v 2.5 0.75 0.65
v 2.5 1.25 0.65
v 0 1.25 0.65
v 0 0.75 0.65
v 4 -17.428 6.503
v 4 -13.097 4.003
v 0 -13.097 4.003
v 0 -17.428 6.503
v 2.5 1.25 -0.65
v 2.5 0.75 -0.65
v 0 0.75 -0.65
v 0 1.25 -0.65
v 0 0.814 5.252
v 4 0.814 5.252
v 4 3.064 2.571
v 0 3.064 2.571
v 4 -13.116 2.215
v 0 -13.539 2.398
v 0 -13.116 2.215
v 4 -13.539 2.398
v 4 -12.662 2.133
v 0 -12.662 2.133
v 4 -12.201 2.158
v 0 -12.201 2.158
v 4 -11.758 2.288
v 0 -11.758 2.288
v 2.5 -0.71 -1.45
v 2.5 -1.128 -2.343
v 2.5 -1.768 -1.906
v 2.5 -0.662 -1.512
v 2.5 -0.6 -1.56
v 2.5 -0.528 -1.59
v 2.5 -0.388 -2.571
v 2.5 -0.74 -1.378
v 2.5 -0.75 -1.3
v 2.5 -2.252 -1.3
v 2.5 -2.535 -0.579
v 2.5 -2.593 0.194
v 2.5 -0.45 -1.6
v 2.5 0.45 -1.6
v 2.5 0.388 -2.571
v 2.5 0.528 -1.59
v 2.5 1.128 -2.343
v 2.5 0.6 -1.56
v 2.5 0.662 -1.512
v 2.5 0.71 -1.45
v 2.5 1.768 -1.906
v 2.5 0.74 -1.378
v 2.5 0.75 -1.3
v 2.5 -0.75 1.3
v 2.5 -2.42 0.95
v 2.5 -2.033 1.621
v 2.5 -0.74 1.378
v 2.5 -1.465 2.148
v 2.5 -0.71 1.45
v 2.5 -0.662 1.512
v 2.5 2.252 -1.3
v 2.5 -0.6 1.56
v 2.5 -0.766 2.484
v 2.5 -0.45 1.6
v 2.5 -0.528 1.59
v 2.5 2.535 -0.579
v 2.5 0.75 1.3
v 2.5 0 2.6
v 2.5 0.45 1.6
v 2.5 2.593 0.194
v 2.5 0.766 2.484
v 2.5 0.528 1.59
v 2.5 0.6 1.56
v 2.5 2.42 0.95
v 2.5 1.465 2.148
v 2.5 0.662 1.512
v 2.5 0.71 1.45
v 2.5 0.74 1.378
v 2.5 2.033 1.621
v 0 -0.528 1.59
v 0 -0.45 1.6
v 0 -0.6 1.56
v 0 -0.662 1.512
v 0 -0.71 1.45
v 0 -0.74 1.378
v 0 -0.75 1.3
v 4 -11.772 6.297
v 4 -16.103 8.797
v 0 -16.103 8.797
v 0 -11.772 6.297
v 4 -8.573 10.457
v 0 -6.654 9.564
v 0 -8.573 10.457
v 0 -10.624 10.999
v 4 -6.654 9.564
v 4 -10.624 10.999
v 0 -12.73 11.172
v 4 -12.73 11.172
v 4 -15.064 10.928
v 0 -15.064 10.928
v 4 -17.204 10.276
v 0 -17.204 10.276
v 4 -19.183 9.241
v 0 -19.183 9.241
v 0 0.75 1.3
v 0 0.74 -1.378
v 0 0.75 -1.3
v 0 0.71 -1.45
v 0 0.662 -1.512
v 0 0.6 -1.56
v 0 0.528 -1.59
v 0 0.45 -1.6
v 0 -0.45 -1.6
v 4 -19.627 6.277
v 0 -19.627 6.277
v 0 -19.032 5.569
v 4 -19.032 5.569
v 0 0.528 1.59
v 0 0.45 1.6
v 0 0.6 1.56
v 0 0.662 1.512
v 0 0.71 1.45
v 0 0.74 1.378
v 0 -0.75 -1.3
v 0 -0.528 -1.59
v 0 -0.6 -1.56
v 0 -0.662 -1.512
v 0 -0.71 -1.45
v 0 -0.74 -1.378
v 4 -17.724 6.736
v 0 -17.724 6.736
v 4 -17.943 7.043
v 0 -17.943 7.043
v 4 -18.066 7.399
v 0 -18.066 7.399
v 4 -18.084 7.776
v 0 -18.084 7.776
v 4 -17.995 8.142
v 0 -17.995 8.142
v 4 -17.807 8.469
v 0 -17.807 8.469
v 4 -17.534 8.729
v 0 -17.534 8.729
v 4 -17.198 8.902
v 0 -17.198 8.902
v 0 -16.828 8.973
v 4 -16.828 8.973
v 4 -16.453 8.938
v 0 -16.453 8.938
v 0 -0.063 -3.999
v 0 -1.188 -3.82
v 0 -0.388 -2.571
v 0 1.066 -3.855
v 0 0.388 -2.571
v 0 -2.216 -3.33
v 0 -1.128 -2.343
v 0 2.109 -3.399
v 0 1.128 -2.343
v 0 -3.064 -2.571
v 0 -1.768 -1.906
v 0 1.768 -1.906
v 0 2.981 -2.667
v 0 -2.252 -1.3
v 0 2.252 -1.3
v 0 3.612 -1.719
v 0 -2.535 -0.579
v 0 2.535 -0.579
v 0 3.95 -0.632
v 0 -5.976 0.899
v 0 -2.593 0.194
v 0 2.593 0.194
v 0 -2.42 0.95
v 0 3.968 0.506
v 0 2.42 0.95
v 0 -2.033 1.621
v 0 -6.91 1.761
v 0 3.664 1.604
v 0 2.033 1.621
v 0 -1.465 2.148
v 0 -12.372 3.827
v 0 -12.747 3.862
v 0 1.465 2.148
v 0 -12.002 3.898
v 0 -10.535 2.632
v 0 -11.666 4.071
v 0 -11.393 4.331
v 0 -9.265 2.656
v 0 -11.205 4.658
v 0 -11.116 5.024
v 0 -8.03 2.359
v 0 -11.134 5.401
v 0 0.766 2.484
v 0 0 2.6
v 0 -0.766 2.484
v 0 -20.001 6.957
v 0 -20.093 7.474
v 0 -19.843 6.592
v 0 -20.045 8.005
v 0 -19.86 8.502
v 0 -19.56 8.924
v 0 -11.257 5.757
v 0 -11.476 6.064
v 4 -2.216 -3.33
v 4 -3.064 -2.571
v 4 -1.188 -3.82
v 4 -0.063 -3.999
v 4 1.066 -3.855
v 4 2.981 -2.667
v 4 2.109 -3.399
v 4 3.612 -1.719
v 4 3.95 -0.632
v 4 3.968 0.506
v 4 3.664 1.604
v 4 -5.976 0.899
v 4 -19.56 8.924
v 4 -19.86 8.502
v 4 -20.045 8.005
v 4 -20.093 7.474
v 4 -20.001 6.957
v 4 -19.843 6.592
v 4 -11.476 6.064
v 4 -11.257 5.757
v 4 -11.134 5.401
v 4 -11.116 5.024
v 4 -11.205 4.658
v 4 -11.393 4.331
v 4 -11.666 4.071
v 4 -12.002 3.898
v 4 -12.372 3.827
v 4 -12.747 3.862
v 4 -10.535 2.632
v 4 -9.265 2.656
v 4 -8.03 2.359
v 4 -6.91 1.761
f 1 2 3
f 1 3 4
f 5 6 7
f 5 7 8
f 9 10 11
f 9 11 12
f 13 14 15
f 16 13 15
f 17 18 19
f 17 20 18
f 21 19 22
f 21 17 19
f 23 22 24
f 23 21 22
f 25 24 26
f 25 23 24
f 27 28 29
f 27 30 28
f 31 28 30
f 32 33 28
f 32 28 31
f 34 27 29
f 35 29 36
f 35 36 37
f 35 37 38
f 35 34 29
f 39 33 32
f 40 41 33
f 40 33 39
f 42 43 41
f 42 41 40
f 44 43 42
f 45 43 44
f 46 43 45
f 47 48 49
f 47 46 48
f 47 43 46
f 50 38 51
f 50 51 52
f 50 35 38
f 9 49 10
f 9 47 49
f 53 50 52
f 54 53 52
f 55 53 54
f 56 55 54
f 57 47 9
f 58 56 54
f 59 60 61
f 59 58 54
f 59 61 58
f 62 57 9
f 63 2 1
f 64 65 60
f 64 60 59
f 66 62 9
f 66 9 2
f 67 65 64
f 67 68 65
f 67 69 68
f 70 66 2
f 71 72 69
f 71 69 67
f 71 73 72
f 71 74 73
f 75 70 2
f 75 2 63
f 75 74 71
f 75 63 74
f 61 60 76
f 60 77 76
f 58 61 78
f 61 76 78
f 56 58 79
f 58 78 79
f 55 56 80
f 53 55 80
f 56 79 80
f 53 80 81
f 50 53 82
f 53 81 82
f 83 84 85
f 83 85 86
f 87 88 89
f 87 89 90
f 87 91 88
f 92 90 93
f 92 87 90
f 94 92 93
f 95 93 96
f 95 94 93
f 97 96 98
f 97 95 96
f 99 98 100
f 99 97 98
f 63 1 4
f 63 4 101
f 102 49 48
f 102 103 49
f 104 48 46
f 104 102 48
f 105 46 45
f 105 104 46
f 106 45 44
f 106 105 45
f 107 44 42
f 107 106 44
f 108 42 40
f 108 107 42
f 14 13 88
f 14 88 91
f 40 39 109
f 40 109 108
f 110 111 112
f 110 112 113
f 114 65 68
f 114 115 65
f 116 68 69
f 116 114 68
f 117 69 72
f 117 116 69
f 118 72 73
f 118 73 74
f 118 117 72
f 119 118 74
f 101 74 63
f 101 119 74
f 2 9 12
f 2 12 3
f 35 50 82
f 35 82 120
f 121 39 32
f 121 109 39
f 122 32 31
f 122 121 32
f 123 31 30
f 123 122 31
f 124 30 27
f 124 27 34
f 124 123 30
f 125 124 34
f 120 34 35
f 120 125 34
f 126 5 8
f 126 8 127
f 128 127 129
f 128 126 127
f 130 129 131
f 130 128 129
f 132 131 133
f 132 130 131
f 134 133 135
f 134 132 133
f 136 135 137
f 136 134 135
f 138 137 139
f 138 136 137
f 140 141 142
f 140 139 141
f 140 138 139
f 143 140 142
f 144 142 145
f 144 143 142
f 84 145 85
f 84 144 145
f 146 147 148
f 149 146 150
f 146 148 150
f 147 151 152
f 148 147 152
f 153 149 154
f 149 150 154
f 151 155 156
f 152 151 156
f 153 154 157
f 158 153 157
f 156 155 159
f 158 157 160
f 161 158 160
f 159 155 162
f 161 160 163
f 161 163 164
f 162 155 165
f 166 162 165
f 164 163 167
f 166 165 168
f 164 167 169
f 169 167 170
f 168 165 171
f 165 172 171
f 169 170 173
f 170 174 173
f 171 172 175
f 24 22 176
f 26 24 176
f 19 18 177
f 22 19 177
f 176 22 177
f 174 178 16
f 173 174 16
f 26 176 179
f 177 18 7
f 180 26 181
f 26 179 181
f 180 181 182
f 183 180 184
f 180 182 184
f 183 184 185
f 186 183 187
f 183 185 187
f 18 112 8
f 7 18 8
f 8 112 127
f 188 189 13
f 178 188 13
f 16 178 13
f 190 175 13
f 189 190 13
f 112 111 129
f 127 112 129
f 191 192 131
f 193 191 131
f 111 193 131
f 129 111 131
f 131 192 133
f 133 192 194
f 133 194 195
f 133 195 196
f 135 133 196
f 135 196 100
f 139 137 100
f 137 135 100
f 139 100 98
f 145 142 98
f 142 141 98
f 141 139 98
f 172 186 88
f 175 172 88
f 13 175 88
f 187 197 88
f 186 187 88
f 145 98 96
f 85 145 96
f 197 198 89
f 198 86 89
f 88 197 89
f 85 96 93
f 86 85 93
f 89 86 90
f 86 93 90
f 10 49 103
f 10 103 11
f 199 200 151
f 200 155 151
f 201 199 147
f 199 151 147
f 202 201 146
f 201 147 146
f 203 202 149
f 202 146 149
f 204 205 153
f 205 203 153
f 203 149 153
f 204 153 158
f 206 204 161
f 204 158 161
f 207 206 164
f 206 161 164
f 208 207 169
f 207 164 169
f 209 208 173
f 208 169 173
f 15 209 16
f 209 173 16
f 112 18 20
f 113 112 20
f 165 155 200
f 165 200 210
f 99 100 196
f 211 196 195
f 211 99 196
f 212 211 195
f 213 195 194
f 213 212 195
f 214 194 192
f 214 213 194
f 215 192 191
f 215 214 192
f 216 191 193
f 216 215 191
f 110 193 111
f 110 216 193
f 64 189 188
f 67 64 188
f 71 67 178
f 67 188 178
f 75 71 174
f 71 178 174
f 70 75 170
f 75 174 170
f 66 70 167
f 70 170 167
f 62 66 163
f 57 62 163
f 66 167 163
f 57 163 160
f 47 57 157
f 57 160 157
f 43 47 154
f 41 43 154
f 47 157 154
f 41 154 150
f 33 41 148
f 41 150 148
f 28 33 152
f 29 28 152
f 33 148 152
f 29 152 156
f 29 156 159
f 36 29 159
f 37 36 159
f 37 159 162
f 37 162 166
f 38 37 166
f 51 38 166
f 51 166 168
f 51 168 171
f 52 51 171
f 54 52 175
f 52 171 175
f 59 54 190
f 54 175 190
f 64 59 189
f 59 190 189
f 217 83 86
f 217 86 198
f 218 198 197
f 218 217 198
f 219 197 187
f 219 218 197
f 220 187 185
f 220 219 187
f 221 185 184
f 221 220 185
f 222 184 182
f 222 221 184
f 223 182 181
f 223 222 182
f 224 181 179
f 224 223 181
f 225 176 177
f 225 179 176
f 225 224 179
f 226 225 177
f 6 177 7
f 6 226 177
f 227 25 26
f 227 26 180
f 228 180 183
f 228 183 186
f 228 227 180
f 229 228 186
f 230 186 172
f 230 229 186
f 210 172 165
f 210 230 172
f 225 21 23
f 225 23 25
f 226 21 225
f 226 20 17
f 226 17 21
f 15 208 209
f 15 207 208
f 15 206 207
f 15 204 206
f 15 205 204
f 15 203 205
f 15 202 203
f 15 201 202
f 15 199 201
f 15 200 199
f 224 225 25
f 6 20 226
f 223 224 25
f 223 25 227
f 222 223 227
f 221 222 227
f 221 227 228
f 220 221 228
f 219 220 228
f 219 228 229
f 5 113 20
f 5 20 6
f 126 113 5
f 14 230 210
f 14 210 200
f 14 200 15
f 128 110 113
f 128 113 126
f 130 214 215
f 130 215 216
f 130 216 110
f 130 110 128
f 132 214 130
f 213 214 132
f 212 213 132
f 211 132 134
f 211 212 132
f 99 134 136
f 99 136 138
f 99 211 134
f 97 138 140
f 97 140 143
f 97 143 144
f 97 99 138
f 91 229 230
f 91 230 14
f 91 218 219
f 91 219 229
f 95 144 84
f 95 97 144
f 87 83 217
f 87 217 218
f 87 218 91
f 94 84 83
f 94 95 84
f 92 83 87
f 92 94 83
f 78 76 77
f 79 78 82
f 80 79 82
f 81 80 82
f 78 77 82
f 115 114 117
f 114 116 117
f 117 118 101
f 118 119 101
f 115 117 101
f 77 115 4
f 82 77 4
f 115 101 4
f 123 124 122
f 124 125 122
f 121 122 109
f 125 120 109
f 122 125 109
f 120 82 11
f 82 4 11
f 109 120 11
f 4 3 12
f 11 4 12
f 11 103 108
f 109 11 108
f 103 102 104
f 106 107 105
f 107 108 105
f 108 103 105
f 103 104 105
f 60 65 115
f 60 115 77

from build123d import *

# Parameters (mm, degrees)
SKETCH5_R           = 4
BOSS_EXTRUDE2_DEPTH = 4
BOSS_EXTRUDE3_DEPTH = 4
SKETCH7_R           = 2.6
CUT_EXTRUDE3_DEPTH  = 2.5
BOSS_EXTRUDE4_DEPTH = 2.5
FILLET1_R           = 0.3
SKETCH9_W           = 4
SKETCH9_H           = 10
BOSS_EXTRUDE5_DEPTH = 7
CUT_EXTRUDE4_REACH  = 29.603
CHAMFER1_SIZE       = 16
CHAMFER1_SIZE2      = 5.823523748
CHAMFER2_SIZE       = 7
CHAMFER2_SIZE2      = 2.54779164
FILLET5_R           = 5
FILLET6_R           = 12
FILLET7_R           = 2


with BuildPart() as part:
    # Sketch5 → Boss-Extrude2 (new body)
    with BuildSketch(Plane(origin=(0, 0, 0), x_dir=(0, 0, -1), z_dir=(1, 0, 0))):
        Circle(SKETCH5_R)
    extrude(amount=BOSS_EXTRUDE2_DEPTH)

    # Sketch6 → Boss-Extrude3 (add)
    with BuildSketch(Plane(origin=(0, 0, 0), x_dir=(0, 0, -1), z_dir=(1, 0, 0))):
        Polygon((-2.571150439, 3.064177772), (2.571150439, -3.064177772), (-12.366716202, -15.598536161), (-17.50901708, -9.470180616), align=None)
    extrude(amount=BOSS_EXTRUDE3_DEPTH)

    # Sketch7 → Cut-Extrude3 (cut)
    with BuildSketch(Plane.ZY):
        Circle(SKETCH7_R)
    extrude(amount=-CUT_EXTRUDE3_DEPTH, mode=Mode.SUBTRACT)

    # Sketch8 → Boss-Extrude4 (add)
    with BuildSketch(Plane.ZY.offset(-2.5)):
        Polygon((1.6, -0.75), (-1.6, -0.75), (-1.6, 0.75), (-0.65, 0.75), (-0.65, 1.25), (0.65, 1.25), (0.65, 0.75), (1.6, 0.75), align=None)
    extrude(amount=BOSS_EXTRUDE4_DEPTH)

    # Fillet1
    fillet1_edges = [part.edges().sort_by_distance(p)[0] for p in [
        (1.25, -0.75, 1.6),
        (1.25, 0.75, 1.6),
        (1.25, 0.75, -1.6),
        (1.25, -0.75, -1.6),
    ]]
    fillet(fillet1_edges, radius=FILLET1_R)

    # Sketch9 → Boss-Extrude5 (add)
    with BuildSketch(Plane(origin=(0, -3.064177772, -2.571150439), x_dir=(1, 0, 0), z_dir=(0, -0.766044443118976, -0.6427876096865419))):
        with Locations((2, 14.5)):
            Rectangle(SKETCH9_W, SKETCH9_H)
    extrude(amount=BOSS_EXTRUDE5_DEPTH)

    # Sketch10 → Cut-Extrude4 (cut, up to next)
    with BuildSketch(Plane(origin=(4, 0, 0), x_dir=(0, 0, -1), z_dir=(1, 0, 0)), mode=Mode.PRIVATE) as cut_extrude4_sk1:
        with BuildLine():
            Line((-4.00251634, -13.097436491), (-6.50251634, -17.427563509))
            ThreePointArc((-6.50251634, -17.427563509), (-8.3125, -17.912547169), (-8.79748366, -16.102563509))
            Line((-8.79748366, -16.102563509), (-6.29748366, -11.772436491))
            ThreePointArc((-6.29748366, -11.772436491), (-4.4875, -11.287452831), (-4.00251634, -13.097436491))
        make_face()
    cut_extrude4_tool1 = extrude(cut_extrude4_sk1.sketch, amount=-CUT_EXTRUDE4_REACH, mode=Mode.PRIVATE) & part.part
    add(cut_extrude4_tool1.solids().sort_by_distance((4, -14.6, 6.4))[0], mode=Mode.SUBTRACT)

    # Chamfer1
    chamfer1_edges = [part.edges().sort_by_distance(p)[0] for p in [
        (2, -9.470180616, 17.50901708),
    ]]
    chamfer1_side = [part.faces().sort_by_distance(p)[0] for p in [
        (2, -3.203001422, 10.040083759),
    ]]
    chamfer(chamfer1_edges, length=CHAMFER1_SIZE, length2=CHAMFER1_SIZE2, reference=chamfer1_side[0])

    # Chamfer2
    chamfer2_edges = [part.edges().sort_by_distance(p)[0] for p in [
        (2, -14.532971166, 0.206758503),
    ]]
    chamfer2_side = [part.faces().sort_by_distance(p)[0] for p in [
        (2, -17.746909215, 4.036980719),
    ]]
    chamfer(chamfer2_edges, length=CHAMFER2_SIZE, length2=CHAMFER2_SIZE2, reference=chamfer2_side[0])

    # Fillet5
    # the kernel refuses this fillet: 5 mm, written as the material it adds along each edge
    with BuildSketch(Plane(origin=(4, -9.170660064, 4.706271771), x_dir=(0, -0.7660444431189757, -0.6427876096865421), z_dir=(-1, 0, 0))) as fillet5_piece_1:
        with BuildLine():
            CenterArc((5, -4.969901842), FILLET5_R, 96.289855747, 83.710144253)
            Line((0, -4.969901842), (-0.1, -4.969901842))
            Line((-0.1, -4.969901842), (-0.1, 0))
            Line((-0.1, 0), (0, 0.1))
            ThreePointArc((0, 0.1), (2.22610418, 0.1), (4.441252527, 0.099398037))
            Line((4.441252527, 0.099398037), (4.45220836, 0))
        make_face()
    extrude(amount=4)

    # Fillet6
    fillet6_edges = [part.edges().sort_by_distance(p)[0] for p in [
        (2, -13.931258623, 13.765728169),
    ]]
    fillet(fillet6_edges, radius=FILLET6_R)

    # Fillet7
    fillet7_edges = [part.edges().sort_by_distance(p)[0] for p in [
        (2, -12.581249538, 1.844447401),
        (2, -20.960847263, 7.867202934),
    ]]
    fillet(fillet7_edges, radius=FILLET7_R)


solid = part.part
